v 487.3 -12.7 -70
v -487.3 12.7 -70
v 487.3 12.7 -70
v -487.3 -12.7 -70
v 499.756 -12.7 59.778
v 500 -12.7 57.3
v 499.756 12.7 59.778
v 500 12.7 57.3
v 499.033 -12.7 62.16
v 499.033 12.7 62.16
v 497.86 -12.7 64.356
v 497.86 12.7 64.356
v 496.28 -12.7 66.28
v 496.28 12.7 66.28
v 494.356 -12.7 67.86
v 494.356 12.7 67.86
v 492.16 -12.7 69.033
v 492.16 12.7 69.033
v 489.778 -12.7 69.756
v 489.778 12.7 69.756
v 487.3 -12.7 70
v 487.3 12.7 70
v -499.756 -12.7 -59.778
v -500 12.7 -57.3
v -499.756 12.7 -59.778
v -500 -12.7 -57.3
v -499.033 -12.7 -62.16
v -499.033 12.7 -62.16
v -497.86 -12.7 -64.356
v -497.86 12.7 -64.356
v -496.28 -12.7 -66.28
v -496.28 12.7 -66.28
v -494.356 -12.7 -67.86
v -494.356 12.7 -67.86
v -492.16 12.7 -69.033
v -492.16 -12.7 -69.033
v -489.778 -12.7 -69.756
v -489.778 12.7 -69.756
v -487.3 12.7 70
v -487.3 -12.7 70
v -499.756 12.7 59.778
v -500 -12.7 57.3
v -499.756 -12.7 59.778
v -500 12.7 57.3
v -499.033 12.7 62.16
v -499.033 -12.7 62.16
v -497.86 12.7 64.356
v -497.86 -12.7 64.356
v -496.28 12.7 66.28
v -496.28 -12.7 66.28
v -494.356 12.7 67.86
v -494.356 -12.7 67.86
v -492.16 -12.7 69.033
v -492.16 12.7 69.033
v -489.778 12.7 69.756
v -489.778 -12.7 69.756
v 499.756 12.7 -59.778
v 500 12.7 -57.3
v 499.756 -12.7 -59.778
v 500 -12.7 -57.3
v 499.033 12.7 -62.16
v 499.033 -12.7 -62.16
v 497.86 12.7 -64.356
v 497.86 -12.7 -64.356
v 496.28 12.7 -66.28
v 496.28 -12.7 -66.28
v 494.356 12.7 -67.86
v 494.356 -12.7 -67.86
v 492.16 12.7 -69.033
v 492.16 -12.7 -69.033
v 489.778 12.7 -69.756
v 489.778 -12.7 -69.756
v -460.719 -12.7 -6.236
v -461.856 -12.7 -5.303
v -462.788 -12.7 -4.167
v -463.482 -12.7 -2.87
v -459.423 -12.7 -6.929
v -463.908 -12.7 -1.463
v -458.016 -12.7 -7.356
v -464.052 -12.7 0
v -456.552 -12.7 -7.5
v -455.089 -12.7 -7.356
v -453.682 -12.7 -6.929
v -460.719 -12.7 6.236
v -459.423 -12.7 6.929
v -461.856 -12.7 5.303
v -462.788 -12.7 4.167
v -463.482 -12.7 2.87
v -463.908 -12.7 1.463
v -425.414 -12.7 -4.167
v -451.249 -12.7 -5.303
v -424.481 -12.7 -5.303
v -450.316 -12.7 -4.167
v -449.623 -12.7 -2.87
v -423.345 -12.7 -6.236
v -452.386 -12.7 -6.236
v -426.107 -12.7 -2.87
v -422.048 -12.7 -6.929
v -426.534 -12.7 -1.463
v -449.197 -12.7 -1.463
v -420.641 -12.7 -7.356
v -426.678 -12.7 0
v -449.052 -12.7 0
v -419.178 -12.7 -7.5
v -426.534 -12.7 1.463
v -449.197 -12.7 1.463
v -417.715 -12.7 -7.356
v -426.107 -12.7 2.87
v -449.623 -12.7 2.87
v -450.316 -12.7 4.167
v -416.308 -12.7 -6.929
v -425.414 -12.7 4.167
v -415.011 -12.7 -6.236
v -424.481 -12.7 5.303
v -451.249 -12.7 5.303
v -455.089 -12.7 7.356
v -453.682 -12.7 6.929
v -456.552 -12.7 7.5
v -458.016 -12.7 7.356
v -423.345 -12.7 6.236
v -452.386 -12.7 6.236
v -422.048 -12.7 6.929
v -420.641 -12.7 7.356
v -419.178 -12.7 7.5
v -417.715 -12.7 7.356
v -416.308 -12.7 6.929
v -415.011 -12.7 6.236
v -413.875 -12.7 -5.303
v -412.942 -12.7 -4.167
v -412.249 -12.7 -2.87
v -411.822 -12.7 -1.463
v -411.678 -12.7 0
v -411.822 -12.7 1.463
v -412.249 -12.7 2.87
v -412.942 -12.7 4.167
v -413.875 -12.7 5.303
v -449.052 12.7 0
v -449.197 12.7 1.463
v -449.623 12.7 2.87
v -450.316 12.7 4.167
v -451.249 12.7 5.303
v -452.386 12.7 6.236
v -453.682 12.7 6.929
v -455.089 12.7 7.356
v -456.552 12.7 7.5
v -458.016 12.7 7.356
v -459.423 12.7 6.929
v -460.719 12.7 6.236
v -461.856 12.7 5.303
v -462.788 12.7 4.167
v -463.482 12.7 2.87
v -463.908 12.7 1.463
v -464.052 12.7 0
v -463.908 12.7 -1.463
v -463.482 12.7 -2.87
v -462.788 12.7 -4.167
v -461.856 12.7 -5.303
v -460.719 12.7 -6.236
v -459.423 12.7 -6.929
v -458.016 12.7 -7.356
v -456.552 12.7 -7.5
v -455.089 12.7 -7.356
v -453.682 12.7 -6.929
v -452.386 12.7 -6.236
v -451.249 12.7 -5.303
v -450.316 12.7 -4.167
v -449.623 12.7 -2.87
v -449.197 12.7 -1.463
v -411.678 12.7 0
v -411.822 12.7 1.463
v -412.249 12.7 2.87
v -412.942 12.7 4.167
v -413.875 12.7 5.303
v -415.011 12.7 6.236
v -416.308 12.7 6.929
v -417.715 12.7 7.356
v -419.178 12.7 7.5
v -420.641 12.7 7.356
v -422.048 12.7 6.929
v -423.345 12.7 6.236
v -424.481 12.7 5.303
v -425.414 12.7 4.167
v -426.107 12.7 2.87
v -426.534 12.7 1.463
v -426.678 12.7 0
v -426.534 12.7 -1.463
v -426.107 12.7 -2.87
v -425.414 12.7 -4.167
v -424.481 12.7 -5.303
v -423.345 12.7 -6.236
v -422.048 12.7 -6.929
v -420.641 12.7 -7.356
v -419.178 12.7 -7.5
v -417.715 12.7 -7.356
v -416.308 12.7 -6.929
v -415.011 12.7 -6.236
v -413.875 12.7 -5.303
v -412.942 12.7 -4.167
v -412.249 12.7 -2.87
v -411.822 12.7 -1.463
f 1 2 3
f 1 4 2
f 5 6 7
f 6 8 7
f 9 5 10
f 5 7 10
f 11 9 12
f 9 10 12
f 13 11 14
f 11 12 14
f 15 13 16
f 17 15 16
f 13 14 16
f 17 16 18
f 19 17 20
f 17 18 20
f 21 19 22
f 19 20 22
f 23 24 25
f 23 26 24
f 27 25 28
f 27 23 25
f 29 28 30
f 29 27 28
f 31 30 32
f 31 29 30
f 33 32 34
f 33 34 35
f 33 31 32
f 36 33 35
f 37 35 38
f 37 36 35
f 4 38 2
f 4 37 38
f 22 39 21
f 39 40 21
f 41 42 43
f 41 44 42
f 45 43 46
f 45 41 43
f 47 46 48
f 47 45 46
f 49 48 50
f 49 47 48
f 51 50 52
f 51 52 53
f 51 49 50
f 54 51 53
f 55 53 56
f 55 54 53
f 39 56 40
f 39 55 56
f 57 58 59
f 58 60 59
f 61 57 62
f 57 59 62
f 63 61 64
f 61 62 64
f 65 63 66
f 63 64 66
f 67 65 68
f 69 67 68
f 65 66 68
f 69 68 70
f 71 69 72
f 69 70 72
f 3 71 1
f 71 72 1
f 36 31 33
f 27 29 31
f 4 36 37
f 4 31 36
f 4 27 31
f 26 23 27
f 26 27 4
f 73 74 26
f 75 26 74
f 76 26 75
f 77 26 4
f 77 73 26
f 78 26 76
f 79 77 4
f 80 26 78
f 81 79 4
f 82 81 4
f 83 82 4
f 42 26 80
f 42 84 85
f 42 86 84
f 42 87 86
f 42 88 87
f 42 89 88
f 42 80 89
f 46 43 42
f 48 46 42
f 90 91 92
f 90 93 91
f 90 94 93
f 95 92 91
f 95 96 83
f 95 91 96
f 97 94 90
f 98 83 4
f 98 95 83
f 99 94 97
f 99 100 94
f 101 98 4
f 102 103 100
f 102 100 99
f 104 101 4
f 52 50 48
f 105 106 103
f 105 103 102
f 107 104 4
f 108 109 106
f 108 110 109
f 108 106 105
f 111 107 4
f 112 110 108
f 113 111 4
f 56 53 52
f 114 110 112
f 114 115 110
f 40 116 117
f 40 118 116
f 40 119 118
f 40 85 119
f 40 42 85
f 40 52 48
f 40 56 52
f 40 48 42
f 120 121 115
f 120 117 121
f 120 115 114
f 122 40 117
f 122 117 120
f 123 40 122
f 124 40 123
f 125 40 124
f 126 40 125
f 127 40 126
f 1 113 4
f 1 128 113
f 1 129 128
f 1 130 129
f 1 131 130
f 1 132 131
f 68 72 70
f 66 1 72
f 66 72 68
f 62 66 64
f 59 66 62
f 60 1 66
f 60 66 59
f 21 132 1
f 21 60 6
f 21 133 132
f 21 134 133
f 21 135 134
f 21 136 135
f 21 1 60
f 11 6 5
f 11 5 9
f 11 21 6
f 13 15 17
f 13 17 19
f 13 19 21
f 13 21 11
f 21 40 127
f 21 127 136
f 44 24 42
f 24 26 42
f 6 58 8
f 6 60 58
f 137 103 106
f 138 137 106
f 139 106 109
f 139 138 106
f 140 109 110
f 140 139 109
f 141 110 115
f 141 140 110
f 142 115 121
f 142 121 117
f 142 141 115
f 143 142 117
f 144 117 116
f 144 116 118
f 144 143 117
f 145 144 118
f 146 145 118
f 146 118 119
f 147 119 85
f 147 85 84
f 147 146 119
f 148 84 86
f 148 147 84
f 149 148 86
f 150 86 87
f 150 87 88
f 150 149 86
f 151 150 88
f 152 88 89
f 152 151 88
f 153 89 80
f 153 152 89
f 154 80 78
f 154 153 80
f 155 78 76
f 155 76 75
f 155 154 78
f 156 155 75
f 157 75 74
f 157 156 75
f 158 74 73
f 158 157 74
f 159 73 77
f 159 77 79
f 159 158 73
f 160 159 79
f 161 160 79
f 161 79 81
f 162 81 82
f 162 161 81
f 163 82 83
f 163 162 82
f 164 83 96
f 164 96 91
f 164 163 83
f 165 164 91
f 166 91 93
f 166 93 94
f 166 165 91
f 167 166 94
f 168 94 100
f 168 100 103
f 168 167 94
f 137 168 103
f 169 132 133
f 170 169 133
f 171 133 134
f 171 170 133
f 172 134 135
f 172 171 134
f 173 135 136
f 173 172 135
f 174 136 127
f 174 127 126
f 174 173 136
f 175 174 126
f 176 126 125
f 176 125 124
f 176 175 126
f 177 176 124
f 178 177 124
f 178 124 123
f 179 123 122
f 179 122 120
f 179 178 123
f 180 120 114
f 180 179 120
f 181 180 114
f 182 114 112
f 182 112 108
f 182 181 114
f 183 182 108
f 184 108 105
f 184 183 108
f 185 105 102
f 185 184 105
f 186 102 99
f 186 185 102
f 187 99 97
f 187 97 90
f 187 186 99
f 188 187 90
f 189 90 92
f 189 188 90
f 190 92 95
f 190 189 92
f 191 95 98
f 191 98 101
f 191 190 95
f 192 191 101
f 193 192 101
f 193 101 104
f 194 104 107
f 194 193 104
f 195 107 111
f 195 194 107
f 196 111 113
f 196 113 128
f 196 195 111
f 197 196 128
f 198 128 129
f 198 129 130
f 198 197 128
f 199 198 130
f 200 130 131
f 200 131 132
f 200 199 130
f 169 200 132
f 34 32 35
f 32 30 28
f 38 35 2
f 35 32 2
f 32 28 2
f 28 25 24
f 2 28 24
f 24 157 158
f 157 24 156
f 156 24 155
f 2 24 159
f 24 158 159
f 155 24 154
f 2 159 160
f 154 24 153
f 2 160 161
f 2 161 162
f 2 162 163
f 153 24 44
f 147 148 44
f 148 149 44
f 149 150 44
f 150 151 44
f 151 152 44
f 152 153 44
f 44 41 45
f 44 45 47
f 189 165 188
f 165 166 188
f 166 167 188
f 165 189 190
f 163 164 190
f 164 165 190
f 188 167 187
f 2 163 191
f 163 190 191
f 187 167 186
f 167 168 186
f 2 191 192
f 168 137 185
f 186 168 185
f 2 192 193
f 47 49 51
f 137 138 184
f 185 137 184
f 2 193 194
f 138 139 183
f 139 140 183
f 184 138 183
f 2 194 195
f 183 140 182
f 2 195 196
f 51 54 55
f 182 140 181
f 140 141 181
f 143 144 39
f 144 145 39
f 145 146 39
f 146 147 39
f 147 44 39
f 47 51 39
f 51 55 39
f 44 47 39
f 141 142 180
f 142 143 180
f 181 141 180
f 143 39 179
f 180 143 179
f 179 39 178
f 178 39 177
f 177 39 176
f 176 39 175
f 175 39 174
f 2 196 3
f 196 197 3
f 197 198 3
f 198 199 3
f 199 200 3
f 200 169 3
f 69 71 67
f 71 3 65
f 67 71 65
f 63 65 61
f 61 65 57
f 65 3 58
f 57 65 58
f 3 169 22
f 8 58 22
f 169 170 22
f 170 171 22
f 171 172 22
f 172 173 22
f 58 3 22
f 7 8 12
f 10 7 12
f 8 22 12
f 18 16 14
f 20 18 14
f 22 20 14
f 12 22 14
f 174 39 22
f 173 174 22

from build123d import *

# Parameters (mm, degrees)
F0_W     = 1000
F0_H     = 140
F0_R     = 7.5
F1_DEPTH = 12.7
F2_R     = 12.7


with BuildPart() as f1:
    # F0 (on Front) → F1 (new body, symmetric)
    with BuildSketch(Plane.XZ):
        Rectangle(F0_W, F0_H)
        with Locations((-456.552416, 0)):
            Circle(F0_R, mode=Mode.SUBTRACT)
        with Locations((-419.17792, 0)):
            Circle(F0_R, mode=Mode.SUBTRACT)
    extrude(amount=F1_DEPTH, both=True)

    # F2
    f2_edges = [f1.edges().sort_by_distance(p)[0] for p in [
        (-500, 0, 70),
        (-500, 0, -70),
        (500, 0, 70),
        (500, 0, -70),
    ]]
    fillet(f2_edges, radius=F2_R)


solid = f1.part
